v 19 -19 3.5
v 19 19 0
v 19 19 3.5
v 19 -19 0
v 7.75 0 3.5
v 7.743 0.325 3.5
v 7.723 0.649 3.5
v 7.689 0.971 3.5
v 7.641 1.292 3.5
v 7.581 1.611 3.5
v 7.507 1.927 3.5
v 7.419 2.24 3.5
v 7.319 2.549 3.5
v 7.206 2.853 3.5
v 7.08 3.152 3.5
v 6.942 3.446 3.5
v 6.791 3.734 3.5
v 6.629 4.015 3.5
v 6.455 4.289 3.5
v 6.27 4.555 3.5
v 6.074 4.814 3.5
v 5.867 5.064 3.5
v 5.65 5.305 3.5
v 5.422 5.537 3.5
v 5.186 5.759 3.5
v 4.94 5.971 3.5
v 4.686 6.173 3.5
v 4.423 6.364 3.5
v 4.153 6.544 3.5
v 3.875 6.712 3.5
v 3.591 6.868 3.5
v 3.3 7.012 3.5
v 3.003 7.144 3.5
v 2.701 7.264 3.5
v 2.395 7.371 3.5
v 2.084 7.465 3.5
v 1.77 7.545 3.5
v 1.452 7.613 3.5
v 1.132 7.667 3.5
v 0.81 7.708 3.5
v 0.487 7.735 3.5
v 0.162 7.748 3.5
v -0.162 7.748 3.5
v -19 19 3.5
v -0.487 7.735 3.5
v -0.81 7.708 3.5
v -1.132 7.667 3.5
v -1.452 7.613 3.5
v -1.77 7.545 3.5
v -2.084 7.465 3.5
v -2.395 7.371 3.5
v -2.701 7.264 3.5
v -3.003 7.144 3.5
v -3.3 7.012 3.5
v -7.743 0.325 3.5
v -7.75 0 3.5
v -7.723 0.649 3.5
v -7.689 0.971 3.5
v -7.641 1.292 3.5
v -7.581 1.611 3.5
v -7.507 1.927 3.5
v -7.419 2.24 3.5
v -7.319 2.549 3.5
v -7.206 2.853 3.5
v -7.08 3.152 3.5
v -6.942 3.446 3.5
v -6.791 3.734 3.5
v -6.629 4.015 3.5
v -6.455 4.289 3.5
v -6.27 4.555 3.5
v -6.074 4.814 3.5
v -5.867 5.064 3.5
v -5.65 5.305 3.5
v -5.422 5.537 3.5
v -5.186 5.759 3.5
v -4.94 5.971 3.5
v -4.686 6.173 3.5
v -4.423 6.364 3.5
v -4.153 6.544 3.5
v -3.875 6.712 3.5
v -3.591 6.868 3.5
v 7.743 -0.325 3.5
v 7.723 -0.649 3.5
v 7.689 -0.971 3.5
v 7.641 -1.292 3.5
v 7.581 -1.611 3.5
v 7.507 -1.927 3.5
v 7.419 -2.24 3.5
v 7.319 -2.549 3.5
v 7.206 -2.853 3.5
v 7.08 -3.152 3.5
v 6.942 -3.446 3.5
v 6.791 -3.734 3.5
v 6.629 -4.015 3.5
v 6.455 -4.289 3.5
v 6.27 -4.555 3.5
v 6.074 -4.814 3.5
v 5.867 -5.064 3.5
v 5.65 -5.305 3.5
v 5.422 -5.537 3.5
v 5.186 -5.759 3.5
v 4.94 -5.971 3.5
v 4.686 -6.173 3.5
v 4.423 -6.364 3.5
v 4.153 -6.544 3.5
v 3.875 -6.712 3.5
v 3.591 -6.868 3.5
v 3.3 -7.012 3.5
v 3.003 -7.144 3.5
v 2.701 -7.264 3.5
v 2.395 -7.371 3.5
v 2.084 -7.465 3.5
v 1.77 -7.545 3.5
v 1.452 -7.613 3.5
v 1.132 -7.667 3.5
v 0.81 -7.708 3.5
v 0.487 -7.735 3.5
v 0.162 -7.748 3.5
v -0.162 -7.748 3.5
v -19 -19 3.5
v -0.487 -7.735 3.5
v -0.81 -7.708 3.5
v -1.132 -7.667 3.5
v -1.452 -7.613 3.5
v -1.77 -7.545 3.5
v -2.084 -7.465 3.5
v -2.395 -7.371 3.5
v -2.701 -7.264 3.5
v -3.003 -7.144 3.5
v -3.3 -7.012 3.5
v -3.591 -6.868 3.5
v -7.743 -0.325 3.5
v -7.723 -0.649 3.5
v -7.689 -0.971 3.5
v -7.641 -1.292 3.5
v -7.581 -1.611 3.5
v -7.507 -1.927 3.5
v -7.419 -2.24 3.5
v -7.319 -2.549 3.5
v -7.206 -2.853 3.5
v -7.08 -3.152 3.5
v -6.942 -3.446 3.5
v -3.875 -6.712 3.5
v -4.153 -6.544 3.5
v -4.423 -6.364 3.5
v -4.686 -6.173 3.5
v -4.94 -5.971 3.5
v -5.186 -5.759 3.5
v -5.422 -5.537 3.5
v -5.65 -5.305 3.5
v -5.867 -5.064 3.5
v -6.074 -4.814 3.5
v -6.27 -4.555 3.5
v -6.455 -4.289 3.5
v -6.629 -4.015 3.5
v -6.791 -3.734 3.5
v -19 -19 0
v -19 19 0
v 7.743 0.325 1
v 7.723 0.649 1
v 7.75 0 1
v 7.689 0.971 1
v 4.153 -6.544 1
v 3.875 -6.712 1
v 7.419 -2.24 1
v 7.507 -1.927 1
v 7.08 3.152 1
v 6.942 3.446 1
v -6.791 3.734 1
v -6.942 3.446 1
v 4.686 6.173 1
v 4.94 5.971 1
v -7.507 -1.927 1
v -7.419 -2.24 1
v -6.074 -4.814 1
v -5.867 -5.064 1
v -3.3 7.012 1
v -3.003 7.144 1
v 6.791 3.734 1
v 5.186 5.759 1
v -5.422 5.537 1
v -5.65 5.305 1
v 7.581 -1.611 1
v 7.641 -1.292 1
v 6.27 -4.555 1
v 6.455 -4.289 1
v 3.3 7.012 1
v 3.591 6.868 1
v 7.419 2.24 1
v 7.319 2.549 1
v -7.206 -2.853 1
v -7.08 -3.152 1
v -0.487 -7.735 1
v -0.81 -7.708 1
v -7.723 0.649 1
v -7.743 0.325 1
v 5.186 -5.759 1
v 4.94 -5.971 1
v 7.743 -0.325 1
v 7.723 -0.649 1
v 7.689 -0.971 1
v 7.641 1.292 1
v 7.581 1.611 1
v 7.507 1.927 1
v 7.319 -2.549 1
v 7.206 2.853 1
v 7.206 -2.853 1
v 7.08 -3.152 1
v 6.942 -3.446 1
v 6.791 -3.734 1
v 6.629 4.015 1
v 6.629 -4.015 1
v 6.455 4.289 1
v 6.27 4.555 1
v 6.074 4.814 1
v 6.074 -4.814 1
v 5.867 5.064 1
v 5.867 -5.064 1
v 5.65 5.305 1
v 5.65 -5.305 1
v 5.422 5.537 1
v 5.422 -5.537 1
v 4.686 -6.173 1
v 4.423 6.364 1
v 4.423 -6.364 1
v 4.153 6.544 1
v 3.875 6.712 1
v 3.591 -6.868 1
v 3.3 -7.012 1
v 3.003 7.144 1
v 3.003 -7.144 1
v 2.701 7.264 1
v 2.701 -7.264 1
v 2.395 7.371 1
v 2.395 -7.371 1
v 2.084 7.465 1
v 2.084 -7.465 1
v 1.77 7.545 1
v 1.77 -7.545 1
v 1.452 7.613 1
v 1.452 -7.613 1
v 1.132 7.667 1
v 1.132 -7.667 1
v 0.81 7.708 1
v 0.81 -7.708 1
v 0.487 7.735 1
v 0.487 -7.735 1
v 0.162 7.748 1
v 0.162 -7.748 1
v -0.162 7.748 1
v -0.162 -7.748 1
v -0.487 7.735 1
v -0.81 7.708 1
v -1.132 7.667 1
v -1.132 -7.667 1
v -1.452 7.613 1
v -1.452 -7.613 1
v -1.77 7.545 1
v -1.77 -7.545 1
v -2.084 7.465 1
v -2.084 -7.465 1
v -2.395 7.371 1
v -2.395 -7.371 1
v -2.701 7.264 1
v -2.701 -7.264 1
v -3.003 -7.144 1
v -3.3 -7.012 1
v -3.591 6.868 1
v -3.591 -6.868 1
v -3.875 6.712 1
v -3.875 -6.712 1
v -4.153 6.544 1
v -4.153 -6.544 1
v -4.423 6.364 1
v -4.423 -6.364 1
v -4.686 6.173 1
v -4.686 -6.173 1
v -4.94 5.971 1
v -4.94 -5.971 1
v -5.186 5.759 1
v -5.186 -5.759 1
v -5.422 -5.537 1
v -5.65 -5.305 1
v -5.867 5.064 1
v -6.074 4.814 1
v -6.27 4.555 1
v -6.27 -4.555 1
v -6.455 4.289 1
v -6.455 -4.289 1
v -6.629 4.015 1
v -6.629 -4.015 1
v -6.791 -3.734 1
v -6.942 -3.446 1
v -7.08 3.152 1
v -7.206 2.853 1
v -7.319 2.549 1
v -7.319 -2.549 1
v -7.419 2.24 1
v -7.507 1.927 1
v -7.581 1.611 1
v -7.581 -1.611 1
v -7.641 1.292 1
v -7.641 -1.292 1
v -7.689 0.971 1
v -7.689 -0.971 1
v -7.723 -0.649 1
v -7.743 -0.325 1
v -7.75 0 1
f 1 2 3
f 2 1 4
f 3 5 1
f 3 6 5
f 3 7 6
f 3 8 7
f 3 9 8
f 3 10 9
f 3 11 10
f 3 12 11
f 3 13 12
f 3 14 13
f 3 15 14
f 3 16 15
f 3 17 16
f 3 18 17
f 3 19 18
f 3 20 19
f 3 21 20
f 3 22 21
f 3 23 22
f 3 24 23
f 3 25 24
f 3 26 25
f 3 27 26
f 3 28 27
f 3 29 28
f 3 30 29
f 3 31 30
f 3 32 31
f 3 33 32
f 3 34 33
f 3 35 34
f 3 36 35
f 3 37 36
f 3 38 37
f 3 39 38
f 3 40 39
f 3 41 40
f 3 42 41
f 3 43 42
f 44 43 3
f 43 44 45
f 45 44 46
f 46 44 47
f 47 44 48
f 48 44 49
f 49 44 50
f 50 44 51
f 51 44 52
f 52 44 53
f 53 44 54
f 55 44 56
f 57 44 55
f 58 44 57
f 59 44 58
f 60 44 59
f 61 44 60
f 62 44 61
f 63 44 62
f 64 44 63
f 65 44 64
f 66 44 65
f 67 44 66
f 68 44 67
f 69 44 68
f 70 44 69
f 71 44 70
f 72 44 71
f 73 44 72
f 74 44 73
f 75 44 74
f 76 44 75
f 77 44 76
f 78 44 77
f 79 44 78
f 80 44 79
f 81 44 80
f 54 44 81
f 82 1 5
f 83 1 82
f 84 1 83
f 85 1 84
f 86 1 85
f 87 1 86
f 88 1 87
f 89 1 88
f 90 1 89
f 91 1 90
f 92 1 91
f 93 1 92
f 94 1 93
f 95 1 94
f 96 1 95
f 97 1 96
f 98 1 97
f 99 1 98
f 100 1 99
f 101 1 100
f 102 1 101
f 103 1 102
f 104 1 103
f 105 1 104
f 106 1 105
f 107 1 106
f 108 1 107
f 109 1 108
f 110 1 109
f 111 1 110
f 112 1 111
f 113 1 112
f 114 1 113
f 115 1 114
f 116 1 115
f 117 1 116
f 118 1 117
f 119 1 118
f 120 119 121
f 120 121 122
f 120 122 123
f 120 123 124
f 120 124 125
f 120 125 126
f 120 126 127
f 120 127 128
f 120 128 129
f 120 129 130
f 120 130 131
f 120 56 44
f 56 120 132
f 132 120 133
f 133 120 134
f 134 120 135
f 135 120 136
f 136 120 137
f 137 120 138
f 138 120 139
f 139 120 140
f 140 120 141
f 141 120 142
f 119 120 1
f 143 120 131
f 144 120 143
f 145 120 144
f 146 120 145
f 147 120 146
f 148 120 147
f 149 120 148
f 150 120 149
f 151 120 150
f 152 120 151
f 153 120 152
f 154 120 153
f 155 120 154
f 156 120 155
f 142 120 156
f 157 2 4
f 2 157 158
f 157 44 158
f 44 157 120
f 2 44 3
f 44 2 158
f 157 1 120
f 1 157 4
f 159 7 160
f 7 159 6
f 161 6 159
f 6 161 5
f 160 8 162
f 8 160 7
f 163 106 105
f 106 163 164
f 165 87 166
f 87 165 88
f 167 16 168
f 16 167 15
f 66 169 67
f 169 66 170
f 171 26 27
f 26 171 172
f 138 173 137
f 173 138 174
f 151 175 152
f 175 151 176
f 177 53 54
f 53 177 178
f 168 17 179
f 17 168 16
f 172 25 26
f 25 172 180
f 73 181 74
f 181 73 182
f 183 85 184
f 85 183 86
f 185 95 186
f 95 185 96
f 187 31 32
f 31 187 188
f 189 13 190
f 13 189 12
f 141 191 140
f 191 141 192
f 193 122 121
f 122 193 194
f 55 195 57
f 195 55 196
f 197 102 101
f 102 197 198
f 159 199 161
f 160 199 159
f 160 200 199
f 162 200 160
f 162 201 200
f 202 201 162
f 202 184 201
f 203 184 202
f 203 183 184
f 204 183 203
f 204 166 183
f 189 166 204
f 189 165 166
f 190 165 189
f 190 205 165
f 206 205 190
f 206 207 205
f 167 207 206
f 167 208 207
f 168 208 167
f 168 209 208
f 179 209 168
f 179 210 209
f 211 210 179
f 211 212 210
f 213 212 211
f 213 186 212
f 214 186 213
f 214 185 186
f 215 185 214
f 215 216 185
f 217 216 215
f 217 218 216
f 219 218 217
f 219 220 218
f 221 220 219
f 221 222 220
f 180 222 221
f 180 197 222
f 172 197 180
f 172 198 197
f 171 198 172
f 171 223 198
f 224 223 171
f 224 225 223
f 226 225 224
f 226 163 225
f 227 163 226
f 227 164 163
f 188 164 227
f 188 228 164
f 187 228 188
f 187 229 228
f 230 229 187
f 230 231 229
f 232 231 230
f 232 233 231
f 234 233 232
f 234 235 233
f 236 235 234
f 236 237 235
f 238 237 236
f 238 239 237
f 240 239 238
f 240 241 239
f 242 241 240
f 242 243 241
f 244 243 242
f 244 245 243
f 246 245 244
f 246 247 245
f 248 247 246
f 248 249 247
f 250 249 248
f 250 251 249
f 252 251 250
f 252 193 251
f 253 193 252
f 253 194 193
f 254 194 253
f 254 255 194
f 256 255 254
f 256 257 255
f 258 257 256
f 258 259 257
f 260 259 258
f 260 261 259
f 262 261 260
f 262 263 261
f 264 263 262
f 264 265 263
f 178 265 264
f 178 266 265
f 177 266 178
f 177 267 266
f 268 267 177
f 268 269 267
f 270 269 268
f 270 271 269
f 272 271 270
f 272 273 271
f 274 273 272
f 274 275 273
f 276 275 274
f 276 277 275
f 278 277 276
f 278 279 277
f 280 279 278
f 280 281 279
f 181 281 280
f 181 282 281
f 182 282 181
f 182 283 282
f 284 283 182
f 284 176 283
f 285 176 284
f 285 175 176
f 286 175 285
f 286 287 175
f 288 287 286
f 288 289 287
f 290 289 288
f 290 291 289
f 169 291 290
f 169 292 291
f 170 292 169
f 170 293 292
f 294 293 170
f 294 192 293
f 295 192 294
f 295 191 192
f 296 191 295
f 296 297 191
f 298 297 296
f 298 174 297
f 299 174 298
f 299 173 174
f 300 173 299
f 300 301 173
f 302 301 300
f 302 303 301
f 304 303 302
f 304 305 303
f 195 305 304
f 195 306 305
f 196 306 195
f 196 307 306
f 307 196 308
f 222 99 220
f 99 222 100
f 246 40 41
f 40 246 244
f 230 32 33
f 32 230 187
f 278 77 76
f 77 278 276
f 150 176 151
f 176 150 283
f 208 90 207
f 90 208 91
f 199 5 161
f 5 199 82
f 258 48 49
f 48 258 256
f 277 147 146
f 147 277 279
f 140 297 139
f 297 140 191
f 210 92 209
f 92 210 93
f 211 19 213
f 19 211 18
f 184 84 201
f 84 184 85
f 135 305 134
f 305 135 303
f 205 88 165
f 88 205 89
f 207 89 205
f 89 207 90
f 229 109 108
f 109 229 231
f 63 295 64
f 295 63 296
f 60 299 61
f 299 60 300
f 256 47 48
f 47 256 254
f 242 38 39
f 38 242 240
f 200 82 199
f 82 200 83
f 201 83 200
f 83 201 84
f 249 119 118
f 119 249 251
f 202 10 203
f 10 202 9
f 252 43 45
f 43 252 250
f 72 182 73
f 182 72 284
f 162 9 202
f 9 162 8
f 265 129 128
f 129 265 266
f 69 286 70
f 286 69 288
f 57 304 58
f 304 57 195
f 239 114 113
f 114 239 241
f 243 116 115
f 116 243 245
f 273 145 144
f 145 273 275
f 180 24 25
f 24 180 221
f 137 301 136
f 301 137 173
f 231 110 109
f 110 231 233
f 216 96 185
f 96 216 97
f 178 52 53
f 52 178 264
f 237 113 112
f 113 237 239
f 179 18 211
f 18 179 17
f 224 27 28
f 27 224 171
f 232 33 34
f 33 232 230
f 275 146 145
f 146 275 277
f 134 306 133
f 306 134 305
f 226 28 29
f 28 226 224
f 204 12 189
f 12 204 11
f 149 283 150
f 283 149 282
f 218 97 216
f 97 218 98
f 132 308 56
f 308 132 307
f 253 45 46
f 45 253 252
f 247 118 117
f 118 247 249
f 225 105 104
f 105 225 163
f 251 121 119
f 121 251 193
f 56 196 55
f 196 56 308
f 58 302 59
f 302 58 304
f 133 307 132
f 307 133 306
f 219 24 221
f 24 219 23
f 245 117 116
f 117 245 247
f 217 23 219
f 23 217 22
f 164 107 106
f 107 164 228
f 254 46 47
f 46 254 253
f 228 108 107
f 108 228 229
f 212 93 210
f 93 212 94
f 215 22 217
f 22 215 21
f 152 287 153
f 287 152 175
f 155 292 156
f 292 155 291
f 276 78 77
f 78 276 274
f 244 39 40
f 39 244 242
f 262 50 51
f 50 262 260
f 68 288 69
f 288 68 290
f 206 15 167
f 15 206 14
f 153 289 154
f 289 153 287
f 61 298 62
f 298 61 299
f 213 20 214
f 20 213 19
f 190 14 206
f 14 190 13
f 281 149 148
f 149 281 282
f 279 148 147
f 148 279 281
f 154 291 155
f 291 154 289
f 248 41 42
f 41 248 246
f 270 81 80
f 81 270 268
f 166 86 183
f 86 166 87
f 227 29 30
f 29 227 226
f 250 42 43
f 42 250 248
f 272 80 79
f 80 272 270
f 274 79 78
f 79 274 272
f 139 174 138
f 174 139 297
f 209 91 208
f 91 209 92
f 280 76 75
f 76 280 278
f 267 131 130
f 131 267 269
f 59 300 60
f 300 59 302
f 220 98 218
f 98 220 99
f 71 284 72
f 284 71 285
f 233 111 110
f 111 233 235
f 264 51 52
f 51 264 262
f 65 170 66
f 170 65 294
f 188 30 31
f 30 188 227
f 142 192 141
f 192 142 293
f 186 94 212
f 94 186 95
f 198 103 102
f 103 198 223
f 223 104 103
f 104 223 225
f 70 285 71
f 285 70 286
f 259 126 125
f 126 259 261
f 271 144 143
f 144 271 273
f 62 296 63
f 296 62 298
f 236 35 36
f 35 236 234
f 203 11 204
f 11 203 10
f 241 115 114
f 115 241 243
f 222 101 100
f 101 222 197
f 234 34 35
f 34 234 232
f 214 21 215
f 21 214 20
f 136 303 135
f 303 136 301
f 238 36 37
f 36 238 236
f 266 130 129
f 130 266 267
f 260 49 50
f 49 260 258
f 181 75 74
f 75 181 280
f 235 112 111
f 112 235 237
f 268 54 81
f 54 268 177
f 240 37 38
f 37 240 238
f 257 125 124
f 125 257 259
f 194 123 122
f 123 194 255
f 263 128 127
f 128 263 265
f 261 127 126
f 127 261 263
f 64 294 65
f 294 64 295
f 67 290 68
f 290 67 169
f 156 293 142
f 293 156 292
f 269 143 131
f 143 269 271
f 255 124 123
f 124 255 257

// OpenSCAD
$fn = 150;

difference() {
	translate(v = [-19.0, -19.0, 0]) {
		cube(size = [38.0, 38.0, 3.5]);
	}
	translate(v = [0, 0, 1.0]) {
		cylinder(d = 15.5, h = 3.5);
	}
}
